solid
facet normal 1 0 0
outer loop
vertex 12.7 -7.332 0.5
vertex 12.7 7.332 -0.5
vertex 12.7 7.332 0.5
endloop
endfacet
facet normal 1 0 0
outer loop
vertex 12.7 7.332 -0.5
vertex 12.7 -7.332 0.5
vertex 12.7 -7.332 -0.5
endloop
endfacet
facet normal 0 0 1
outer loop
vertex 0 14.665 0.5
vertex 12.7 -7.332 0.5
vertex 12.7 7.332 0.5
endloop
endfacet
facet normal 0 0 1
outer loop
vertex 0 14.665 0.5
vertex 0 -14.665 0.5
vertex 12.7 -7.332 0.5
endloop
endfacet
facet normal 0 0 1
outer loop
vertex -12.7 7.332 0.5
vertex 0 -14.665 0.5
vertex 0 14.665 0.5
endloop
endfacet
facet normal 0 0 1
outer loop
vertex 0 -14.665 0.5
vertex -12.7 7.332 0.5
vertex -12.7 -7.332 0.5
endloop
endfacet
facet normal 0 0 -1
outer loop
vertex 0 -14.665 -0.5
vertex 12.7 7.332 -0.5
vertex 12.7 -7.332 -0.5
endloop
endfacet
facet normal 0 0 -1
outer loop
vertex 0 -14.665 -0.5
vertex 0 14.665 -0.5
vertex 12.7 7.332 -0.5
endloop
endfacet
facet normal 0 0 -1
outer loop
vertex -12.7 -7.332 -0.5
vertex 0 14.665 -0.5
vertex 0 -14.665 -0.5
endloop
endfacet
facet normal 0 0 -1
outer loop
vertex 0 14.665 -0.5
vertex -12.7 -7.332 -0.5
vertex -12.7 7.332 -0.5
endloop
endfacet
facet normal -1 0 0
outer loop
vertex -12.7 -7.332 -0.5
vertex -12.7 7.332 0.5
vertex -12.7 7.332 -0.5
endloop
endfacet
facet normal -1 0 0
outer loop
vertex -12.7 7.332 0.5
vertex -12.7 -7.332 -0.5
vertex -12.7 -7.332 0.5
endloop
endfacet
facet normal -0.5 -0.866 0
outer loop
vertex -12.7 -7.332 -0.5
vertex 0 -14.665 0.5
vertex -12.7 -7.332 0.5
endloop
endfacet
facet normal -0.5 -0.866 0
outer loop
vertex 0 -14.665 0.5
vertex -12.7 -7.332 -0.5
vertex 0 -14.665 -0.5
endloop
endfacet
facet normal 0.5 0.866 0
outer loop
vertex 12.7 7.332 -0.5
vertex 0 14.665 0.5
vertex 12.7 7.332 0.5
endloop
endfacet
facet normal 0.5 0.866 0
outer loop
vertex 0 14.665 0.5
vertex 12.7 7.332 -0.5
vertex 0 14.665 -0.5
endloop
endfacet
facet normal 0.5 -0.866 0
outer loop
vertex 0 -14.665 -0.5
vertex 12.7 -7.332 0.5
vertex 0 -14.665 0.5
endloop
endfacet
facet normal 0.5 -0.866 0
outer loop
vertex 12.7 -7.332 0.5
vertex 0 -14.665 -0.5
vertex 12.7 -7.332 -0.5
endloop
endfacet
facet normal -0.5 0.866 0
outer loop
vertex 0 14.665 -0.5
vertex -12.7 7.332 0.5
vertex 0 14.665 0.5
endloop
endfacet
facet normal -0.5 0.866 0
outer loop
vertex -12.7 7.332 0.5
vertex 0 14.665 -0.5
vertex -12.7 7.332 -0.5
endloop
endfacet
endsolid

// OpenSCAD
//============================================================
// OpenSCAD
// Licence : LICENCE PUBLIQUE RIEN À BRANLER
// Licence : do What The Fuck you want to Public License
//============================================================
/*

	Usage:
	use <Hexagones.scad>;
	Pour créer des jeux, des têtes de vis...

*/


//------------------------------------------------------------
// Demo
//------------------------------------------------------------
$fn = 150 ;			// OpenSCAD Resolution
// hexagone de 1 pouce (1 inch) soit 25.4 mm
Hexagone(cle=25.4,h=1);

//------------------------------------------------------------
// Hexagone
// cle	écart, ex: clé de 12 alors cle=12
// h		hauteur
//------------------------------------------------------------
module Hexagone(cle,h)
{
	angle = 360/6;		// 6 pans
	cote = cle * cot(angle);
	echo(angle, cot(angle), cote);
	echo(acos(.6));

	union()
	{
		rotate([0,0,0])
			cube([cle,cote,h],center=true);
		rotate([0,0,angle])
			cube([cle,cote,h],center=true);
		rotate([0,0,2*angle])
			cube([cle,cote,h],center=true);
	}

// Vérification par un cercle de taille cle
//	#cylinder(r=cle/2,h=2*h,center=true);
//	%circle(r=cote,center=true);
//	#cube([cote,cote,1]);
}

//------------------------------------------------------------
// Fonction cotangente
// Permet d'avoir les bones dimensions
// utiliser $fn n'est pas bon
//------------------------------------------------------------
function cot(x)=1/tan(x);

//==EOF=======================================================
